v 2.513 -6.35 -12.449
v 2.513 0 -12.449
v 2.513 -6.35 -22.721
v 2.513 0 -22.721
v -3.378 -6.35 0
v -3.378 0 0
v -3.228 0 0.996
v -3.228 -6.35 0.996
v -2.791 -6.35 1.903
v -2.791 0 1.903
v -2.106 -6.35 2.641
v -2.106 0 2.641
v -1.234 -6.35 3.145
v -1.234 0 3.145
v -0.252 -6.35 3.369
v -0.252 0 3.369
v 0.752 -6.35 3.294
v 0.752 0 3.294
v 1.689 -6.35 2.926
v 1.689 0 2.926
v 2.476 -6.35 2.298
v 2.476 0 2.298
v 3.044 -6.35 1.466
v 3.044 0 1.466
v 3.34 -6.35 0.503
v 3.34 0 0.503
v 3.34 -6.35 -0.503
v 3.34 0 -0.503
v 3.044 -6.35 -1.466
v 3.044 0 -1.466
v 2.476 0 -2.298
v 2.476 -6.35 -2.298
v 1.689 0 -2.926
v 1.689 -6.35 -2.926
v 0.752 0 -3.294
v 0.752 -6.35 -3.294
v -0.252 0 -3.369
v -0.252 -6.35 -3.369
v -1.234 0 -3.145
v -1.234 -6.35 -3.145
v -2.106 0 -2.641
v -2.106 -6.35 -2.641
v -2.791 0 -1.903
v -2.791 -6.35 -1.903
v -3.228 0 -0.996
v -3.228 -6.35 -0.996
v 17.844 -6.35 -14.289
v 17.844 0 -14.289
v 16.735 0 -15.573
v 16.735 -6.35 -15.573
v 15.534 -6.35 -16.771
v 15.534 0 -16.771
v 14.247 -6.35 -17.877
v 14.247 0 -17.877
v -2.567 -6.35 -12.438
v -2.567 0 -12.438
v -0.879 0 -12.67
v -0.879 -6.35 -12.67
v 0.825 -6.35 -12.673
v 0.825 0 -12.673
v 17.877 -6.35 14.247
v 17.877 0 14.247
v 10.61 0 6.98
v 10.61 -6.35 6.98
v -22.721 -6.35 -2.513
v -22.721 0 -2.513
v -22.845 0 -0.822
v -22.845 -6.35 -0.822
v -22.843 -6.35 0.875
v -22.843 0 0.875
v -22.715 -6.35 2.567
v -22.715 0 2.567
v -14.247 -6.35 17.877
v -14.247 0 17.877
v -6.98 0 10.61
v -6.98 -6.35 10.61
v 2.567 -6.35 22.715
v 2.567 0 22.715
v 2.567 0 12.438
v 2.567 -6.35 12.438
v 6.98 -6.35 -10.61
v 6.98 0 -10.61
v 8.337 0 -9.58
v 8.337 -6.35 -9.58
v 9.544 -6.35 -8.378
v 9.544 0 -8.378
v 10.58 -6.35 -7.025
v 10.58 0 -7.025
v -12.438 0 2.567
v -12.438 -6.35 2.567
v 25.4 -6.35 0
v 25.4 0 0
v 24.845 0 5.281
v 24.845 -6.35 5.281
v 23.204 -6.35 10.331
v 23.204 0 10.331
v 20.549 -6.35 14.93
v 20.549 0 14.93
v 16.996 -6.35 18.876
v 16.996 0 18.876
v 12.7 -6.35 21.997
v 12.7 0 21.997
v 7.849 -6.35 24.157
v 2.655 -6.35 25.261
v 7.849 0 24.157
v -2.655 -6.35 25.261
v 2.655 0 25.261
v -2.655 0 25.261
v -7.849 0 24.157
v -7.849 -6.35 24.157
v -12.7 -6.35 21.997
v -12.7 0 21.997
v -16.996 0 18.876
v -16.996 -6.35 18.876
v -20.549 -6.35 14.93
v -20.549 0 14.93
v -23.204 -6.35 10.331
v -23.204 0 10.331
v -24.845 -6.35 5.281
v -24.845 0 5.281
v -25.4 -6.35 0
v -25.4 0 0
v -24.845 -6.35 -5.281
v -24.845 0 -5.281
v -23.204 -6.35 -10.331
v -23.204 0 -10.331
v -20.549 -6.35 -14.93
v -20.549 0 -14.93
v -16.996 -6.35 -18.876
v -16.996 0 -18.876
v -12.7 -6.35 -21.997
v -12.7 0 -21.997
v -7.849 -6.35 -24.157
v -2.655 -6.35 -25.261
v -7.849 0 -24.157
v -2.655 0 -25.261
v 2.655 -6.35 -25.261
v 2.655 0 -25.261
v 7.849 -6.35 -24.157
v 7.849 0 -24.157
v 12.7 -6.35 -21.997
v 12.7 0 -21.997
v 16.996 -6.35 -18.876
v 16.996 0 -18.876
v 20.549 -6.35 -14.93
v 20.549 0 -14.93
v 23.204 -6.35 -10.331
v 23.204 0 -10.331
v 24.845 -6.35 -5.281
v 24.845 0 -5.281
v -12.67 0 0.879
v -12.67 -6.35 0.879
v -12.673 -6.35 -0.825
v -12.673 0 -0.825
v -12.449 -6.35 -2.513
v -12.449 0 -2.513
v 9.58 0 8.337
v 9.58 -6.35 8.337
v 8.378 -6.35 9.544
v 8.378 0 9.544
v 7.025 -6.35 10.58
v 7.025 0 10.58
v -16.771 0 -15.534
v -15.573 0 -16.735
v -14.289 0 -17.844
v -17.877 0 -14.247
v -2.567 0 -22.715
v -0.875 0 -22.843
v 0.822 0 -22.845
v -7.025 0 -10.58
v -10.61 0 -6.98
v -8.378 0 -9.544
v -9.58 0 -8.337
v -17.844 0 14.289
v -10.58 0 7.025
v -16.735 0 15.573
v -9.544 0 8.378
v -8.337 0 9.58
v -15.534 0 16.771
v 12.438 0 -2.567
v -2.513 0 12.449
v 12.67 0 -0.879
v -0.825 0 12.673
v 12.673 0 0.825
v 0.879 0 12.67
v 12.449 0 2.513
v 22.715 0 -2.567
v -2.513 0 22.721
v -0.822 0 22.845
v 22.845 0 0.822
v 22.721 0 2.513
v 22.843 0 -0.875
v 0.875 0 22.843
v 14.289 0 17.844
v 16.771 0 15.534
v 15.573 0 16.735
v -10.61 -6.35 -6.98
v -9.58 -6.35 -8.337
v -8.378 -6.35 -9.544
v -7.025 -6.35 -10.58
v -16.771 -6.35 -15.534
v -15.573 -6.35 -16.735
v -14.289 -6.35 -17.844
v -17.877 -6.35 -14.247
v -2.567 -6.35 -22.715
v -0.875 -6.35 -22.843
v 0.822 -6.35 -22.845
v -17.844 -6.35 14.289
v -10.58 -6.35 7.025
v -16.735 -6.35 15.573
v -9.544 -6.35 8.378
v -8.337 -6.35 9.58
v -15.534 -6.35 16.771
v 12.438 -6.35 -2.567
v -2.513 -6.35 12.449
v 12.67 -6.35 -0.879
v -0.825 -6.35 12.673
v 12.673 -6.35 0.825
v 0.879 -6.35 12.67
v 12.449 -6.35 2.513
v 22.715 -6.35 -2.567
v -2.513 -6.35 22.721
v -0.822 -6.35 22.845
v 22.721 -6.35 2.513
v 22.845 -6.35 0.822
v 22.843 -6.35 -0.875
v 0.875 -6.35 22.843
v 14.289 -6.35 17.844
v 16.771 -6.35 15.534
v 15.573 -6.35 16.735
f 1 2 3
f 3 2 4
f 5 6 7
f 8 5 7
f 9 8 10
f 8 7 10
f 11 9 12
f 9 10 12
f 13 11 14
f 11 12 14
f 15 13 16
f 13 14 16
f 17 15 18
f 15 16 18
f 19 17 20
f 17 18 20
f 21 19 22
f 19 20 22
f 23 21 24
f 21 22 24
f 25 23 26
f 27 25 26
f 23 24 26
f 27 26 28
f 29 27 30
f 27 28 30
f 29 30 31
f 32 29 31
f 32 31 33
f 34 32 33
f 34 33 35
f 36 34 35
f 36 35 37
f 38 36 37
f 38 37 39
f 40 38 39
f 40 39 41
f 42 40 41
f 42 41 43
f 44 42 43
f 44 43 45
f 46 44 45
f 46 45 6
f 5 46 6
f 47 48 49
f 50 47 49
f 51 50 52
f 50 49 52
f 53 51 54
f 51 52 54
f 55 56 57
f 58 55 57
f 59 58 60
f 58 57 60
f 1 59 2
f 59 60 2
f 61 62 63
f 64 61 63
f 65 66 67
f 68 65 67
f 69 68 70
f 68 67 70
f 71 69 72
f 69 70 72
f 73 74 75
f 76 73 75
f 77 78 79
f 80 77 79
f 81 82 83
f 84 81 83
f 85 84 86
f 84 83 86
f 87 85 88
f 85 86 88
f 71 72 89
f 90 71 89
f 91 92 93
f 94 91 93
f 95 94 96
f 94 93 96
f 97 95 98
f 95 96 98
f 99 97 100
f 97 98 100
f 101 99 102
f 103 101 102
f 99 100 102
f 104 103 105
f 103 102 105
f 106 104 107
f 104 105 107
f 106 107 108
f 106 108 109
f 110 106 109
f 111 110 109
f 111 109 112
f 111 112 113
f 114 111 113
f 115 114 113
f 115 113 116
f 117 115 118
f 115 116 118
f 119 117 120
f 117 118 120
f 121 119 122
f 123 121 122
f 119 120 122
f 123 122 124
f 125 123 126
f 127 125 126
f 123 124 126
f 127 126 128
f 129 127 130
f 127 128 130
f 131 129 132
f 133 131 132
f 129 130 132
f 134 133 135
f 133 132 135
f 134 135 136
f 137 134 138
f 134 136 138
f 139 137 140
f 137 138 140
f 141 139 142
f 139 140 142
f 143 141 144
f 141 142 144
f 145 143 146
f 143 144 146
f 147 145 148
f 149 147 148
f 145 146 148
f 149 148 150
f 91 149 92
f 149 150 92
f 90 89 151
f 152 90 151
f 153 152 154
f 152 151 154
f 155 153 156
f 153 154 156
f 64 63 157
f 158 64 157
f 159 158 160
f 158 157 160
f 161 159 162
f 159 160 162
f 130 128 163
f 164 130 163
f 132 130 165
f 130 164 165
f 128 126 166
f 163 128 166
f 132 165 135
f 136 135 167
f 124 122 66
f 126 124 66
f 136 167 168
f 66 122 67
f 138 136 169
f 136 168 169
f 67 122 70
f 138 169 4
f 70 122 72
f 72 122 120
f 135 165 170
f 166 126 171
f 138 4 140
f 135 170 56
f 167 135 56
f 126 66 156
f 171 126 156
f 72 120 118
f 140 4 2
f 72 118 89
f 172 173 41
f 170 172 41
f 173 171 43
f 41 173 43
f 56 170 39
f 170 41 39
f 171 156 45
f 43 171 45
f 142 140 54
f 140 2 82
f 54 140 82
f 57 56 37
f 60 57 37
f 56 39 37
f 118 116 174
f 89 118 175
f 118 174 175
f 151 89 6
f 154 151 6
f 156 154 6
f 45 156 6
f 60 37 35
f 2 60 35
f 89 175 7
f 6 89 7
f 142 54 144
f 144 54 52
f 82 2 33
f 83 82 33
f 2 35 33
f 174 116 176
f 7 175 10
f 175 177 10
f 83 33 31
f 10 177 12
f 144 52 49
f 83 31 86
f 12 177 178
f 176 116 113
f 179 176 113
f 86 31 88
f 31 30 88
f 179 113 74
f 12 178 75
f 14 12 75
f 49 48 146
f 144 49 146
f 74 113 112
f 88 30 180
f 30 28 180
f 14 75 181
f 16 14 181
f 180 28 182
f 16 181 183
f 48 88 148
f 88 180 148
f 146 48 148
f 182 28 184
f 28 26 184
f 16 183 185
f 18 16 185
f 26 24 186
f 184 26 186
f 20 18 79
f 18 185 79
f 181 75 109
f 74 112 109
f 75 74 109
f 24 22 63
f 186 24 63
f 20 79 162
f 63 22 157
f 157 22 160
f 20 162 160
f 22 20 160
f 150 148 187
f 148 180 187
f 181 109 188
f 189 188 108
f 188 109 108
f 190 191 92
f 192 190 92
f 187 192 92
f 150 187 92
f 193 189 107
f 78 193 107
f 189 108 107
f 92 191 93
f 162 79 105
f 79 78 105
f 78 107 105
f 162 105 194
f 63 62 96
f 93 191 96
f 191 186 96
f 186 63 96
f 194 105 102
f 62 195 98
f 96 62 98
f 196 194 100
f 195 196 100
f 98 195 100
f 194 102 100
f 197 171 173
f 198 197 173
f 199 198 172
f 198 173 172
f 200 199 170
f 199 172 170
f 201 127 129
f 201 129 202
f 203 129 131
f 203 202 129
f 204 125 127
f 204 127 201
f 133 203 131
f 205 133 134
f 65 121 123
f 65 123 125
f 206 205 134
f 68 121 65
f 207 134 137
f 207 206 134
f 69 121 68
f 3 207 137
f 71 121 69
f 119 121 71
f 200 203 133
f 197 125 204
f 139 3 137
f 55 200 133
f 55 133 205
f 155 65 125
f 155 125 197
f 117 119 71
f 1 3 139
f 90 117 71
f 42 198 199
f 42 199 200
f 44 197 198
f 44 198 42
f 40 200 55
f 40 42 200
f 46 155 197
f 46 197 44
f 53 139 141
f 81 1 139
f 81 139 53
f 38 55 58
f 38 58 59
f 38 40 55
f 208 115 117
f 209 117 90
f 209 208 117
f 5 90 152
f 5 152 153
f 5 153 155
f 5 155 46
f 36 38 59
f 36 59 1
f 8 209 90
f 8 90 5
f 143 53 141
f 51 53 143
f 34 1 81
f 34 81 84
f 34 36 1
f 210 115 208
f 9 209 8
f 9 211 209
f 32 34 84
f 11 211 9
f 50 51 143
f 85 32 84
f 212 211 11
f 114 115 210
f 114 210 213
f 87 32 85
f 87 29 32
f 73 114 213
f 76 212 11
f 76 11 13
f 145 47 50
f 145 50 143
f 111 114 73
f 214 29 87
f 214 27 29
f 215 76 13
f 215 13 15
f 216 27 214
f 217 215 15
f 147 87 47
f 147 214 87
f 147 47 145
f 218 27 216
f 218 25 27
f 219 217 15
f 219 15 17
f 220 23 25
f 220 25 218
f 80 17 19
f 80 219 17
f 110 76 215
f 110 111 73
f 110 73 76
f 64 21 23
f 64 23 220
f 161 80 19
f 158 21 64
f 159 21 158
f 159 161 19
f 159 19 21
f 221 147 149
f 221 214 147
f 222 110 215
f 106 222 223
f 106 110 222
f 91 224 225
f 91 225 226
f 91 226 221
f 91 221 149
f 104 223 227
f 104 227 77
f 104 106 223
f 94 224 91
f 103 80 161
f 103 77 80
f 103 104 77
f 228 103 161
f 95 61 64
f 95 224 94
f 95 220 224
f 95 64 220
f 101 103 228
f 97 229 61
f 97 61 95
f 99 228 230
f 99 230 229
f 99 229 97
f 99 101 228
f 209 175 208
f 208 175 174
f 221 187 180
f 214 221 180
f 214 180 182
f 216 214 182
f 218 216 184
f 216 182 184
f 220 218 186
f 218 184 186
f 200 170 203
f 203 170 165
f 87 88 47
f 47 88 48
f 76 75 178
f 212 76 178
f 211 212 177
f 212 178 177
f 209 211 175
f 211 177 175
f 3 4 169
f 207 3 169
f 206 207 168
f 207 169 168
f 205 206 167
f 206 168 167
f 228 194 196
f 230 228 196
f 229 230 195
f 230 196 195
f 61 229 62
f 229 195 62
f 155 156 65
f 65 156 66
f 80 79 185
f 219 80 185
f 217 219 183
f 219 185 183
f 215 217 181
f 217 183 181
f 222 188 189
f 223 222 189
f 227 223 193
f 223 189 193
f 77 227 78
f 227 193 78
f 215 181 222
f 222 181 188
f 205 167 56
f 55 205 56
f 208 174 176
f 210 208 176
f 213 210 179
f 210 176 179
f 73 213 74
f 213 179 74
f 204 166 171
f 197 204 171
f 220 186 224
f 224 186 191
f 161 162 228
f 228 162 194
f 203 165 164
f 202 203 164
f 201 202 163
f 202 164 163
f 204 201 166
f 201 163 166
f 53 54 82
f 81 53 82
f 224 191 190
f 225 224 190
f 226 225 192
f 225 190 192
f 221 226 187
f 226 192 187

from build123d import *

# Parameters (mm, degrees)
F0_R     = 25.4
F1_DEPTH = 6.35
F3_D     = 6.7564
F3_DEPTH = 11.9126
F3_TIP   = 2.0298273432


with BuildPart() as f1:
    # F0 (on Front) → F1 (new body)
    with BuildSketch(Plane.XZ):
        Circle(F0_R)
        with BuildLine():
            ThreePointArc((2.5134499214, -22.7214033346), (-0.0267137561, -22.8599843914), (-2.56654661, -22.7154669443))
            Line((-2.56654661, -22.7154669443), (-2.56654661, -12.4379595794))
            ThreePointArc((-2.56654661, -12.4379595794), (-0.0270957922, -12.6999710952), (2.5134499214, -12.4487979135))
            Line((2.5134499214, -12.4487979135), (2.5134499214, -22.7214033346))
        make_face(mode=Mode.SUBTRACT)
        with BuildLine():
            ThreePointArc((-14.2891808923, -17.8437358596), (-16.1833394591, -16.1455605029), (-17.8770832263, -14.247438202))
            Line((-17.8770832263, -14.247438202), (-10.6097880749, -6.9801430506))
            ThreePointArc((-10.6097880749, -6.9801430506), (-8.9993953007, -8.9610760639), (-7.0253519387, -10.5799069059))
            Line((-7.0253519387, -10.5799069059), (-14.2891808923, -17.8437358596))
        make_face(mode=Mode.SUBTRACT)
        with BuildLine():
            ThreePointArc((17.8437358596, -14.2891808923), (16.1455605029, -16.1833394591), (14.247438202, -17.8770832263))
            Line((14.247438202, -17.8770832263), (6.9801430506, -10.6097880749))
            ThreePointArc((6.9801430506, -10.6097880749), (8.9610760639, -8.9993953007), (10.5799069059, -7.0253519387))
            Line((10.5799069059, -7.0253519387), (17.8437358596, -14.2891808923))
        make_face(mode=Mode.SUBTRACT)
        with BuildLine():
            ThreePointArc((22.7214033346, 2.5134499214), (22.8599843914, -0.0267137561), (22.7154669443, -2.56654661))
            Line((22.7154669443, -2.56654661), (12.4379595794, -2.56654661))
            ThreePointArc((12.4379595794, -2.56654661), (12.6999710952, -0.0270957922), (12.4487979135, 2.5134499214))
            Line((12.4487979135, 2.5134499214), (22.7214033346, 2.5134499214))
        make_face(mode=Mode.SUBTRACT)
        with BuildLine():
            ThreePointArc((-22.7214033346, -2.5134499214), (-22.8599843914, 0.0267137561), (-22.7154669443, 2.56654661))
            Line((-22.7154669443, 2.56654661), (-12.4379595794, 2.56654661))
            ThreePointArc((-12.4379595794, 2.56654661), (-12.6999710952, 0.0270957922), (-12.4487979135, -2.5134499214))
            Line((-12.4487979135, -2.5134499214), (-22.7214033346, -2.5134499214))
        make_face(mode=Mode.SUBTRACT)
        with BuildLine():
            ThreePointArc((-17.8437358596, 14.2891808923), (-16.1455605029, 16.1833394591), (-14.247438202, 17.8770832263))
            Line((-14.247438202, 17.8770832263), (-6.9801430506, 10.6097880749))
            ThreePointArc((-6.9801430506, 10.6097880749), (-8.9610760639, 8.9993953007), (-10.5799069059, 7.0253519387))
            Line((-10.5799069059, 7.0253519387), (-17.8437358596, 14.2891808923))
        make_face(mode=Mode.SUBTRACT)
        with BuildLine():
            ThreePointArc((14.2891808923, 17.8437358596), (16.1833394591, 16.1455605029), (17.8770832263, 14.247438202))
            Line((17.8770832263, 14.247438202), (10.6097880749, 6.9801430506))
            ThreePointArc((10.6097880749, 6.9801430506), (8.9993953007, 8.9610760639), (7.0253519387, 10.5799069059))
            Line((7.0253519387, 10.5799069059), (14.2891808923, 17.8437358596))
        make_face(mode=Mode.SUBTRACT)
        with BuildLine():
            Line((-2.5134499214, 12.4487979135), (-2.5134499214, 22.7214033346))
            ThreePointArc((-2.5134499214, 22.7214033346), (0.0267137561, 22.8599843914), (2.56654661, 22.7154669443))
            Line((2.56654661, 22.7154669443), (2.56654661, 12.4379595794))
            ThreePointArc((2.56654661, 12.4379595794), (0.0270957922, 12.6999710952), (-2.5134499214, 12.4487979135))
        make_face(mode=Mode.SUBTRACT)
    extrude(amount=F1_DEPTH)

    # F3
    with Locations(Plane.XZ.offset(6.35)):
        with Locations((0, 0)):
            Hole(F3_D / 2, depth=F3_DEPTH)
            with Locations((0, 0, -(F3_DEPTH + F3_TIP / 2))):  # 118° drill point
                Cone(0, F3_D / 2, F3_TIP, mode=Mode.SUBTRACT)


solid = f1.part
